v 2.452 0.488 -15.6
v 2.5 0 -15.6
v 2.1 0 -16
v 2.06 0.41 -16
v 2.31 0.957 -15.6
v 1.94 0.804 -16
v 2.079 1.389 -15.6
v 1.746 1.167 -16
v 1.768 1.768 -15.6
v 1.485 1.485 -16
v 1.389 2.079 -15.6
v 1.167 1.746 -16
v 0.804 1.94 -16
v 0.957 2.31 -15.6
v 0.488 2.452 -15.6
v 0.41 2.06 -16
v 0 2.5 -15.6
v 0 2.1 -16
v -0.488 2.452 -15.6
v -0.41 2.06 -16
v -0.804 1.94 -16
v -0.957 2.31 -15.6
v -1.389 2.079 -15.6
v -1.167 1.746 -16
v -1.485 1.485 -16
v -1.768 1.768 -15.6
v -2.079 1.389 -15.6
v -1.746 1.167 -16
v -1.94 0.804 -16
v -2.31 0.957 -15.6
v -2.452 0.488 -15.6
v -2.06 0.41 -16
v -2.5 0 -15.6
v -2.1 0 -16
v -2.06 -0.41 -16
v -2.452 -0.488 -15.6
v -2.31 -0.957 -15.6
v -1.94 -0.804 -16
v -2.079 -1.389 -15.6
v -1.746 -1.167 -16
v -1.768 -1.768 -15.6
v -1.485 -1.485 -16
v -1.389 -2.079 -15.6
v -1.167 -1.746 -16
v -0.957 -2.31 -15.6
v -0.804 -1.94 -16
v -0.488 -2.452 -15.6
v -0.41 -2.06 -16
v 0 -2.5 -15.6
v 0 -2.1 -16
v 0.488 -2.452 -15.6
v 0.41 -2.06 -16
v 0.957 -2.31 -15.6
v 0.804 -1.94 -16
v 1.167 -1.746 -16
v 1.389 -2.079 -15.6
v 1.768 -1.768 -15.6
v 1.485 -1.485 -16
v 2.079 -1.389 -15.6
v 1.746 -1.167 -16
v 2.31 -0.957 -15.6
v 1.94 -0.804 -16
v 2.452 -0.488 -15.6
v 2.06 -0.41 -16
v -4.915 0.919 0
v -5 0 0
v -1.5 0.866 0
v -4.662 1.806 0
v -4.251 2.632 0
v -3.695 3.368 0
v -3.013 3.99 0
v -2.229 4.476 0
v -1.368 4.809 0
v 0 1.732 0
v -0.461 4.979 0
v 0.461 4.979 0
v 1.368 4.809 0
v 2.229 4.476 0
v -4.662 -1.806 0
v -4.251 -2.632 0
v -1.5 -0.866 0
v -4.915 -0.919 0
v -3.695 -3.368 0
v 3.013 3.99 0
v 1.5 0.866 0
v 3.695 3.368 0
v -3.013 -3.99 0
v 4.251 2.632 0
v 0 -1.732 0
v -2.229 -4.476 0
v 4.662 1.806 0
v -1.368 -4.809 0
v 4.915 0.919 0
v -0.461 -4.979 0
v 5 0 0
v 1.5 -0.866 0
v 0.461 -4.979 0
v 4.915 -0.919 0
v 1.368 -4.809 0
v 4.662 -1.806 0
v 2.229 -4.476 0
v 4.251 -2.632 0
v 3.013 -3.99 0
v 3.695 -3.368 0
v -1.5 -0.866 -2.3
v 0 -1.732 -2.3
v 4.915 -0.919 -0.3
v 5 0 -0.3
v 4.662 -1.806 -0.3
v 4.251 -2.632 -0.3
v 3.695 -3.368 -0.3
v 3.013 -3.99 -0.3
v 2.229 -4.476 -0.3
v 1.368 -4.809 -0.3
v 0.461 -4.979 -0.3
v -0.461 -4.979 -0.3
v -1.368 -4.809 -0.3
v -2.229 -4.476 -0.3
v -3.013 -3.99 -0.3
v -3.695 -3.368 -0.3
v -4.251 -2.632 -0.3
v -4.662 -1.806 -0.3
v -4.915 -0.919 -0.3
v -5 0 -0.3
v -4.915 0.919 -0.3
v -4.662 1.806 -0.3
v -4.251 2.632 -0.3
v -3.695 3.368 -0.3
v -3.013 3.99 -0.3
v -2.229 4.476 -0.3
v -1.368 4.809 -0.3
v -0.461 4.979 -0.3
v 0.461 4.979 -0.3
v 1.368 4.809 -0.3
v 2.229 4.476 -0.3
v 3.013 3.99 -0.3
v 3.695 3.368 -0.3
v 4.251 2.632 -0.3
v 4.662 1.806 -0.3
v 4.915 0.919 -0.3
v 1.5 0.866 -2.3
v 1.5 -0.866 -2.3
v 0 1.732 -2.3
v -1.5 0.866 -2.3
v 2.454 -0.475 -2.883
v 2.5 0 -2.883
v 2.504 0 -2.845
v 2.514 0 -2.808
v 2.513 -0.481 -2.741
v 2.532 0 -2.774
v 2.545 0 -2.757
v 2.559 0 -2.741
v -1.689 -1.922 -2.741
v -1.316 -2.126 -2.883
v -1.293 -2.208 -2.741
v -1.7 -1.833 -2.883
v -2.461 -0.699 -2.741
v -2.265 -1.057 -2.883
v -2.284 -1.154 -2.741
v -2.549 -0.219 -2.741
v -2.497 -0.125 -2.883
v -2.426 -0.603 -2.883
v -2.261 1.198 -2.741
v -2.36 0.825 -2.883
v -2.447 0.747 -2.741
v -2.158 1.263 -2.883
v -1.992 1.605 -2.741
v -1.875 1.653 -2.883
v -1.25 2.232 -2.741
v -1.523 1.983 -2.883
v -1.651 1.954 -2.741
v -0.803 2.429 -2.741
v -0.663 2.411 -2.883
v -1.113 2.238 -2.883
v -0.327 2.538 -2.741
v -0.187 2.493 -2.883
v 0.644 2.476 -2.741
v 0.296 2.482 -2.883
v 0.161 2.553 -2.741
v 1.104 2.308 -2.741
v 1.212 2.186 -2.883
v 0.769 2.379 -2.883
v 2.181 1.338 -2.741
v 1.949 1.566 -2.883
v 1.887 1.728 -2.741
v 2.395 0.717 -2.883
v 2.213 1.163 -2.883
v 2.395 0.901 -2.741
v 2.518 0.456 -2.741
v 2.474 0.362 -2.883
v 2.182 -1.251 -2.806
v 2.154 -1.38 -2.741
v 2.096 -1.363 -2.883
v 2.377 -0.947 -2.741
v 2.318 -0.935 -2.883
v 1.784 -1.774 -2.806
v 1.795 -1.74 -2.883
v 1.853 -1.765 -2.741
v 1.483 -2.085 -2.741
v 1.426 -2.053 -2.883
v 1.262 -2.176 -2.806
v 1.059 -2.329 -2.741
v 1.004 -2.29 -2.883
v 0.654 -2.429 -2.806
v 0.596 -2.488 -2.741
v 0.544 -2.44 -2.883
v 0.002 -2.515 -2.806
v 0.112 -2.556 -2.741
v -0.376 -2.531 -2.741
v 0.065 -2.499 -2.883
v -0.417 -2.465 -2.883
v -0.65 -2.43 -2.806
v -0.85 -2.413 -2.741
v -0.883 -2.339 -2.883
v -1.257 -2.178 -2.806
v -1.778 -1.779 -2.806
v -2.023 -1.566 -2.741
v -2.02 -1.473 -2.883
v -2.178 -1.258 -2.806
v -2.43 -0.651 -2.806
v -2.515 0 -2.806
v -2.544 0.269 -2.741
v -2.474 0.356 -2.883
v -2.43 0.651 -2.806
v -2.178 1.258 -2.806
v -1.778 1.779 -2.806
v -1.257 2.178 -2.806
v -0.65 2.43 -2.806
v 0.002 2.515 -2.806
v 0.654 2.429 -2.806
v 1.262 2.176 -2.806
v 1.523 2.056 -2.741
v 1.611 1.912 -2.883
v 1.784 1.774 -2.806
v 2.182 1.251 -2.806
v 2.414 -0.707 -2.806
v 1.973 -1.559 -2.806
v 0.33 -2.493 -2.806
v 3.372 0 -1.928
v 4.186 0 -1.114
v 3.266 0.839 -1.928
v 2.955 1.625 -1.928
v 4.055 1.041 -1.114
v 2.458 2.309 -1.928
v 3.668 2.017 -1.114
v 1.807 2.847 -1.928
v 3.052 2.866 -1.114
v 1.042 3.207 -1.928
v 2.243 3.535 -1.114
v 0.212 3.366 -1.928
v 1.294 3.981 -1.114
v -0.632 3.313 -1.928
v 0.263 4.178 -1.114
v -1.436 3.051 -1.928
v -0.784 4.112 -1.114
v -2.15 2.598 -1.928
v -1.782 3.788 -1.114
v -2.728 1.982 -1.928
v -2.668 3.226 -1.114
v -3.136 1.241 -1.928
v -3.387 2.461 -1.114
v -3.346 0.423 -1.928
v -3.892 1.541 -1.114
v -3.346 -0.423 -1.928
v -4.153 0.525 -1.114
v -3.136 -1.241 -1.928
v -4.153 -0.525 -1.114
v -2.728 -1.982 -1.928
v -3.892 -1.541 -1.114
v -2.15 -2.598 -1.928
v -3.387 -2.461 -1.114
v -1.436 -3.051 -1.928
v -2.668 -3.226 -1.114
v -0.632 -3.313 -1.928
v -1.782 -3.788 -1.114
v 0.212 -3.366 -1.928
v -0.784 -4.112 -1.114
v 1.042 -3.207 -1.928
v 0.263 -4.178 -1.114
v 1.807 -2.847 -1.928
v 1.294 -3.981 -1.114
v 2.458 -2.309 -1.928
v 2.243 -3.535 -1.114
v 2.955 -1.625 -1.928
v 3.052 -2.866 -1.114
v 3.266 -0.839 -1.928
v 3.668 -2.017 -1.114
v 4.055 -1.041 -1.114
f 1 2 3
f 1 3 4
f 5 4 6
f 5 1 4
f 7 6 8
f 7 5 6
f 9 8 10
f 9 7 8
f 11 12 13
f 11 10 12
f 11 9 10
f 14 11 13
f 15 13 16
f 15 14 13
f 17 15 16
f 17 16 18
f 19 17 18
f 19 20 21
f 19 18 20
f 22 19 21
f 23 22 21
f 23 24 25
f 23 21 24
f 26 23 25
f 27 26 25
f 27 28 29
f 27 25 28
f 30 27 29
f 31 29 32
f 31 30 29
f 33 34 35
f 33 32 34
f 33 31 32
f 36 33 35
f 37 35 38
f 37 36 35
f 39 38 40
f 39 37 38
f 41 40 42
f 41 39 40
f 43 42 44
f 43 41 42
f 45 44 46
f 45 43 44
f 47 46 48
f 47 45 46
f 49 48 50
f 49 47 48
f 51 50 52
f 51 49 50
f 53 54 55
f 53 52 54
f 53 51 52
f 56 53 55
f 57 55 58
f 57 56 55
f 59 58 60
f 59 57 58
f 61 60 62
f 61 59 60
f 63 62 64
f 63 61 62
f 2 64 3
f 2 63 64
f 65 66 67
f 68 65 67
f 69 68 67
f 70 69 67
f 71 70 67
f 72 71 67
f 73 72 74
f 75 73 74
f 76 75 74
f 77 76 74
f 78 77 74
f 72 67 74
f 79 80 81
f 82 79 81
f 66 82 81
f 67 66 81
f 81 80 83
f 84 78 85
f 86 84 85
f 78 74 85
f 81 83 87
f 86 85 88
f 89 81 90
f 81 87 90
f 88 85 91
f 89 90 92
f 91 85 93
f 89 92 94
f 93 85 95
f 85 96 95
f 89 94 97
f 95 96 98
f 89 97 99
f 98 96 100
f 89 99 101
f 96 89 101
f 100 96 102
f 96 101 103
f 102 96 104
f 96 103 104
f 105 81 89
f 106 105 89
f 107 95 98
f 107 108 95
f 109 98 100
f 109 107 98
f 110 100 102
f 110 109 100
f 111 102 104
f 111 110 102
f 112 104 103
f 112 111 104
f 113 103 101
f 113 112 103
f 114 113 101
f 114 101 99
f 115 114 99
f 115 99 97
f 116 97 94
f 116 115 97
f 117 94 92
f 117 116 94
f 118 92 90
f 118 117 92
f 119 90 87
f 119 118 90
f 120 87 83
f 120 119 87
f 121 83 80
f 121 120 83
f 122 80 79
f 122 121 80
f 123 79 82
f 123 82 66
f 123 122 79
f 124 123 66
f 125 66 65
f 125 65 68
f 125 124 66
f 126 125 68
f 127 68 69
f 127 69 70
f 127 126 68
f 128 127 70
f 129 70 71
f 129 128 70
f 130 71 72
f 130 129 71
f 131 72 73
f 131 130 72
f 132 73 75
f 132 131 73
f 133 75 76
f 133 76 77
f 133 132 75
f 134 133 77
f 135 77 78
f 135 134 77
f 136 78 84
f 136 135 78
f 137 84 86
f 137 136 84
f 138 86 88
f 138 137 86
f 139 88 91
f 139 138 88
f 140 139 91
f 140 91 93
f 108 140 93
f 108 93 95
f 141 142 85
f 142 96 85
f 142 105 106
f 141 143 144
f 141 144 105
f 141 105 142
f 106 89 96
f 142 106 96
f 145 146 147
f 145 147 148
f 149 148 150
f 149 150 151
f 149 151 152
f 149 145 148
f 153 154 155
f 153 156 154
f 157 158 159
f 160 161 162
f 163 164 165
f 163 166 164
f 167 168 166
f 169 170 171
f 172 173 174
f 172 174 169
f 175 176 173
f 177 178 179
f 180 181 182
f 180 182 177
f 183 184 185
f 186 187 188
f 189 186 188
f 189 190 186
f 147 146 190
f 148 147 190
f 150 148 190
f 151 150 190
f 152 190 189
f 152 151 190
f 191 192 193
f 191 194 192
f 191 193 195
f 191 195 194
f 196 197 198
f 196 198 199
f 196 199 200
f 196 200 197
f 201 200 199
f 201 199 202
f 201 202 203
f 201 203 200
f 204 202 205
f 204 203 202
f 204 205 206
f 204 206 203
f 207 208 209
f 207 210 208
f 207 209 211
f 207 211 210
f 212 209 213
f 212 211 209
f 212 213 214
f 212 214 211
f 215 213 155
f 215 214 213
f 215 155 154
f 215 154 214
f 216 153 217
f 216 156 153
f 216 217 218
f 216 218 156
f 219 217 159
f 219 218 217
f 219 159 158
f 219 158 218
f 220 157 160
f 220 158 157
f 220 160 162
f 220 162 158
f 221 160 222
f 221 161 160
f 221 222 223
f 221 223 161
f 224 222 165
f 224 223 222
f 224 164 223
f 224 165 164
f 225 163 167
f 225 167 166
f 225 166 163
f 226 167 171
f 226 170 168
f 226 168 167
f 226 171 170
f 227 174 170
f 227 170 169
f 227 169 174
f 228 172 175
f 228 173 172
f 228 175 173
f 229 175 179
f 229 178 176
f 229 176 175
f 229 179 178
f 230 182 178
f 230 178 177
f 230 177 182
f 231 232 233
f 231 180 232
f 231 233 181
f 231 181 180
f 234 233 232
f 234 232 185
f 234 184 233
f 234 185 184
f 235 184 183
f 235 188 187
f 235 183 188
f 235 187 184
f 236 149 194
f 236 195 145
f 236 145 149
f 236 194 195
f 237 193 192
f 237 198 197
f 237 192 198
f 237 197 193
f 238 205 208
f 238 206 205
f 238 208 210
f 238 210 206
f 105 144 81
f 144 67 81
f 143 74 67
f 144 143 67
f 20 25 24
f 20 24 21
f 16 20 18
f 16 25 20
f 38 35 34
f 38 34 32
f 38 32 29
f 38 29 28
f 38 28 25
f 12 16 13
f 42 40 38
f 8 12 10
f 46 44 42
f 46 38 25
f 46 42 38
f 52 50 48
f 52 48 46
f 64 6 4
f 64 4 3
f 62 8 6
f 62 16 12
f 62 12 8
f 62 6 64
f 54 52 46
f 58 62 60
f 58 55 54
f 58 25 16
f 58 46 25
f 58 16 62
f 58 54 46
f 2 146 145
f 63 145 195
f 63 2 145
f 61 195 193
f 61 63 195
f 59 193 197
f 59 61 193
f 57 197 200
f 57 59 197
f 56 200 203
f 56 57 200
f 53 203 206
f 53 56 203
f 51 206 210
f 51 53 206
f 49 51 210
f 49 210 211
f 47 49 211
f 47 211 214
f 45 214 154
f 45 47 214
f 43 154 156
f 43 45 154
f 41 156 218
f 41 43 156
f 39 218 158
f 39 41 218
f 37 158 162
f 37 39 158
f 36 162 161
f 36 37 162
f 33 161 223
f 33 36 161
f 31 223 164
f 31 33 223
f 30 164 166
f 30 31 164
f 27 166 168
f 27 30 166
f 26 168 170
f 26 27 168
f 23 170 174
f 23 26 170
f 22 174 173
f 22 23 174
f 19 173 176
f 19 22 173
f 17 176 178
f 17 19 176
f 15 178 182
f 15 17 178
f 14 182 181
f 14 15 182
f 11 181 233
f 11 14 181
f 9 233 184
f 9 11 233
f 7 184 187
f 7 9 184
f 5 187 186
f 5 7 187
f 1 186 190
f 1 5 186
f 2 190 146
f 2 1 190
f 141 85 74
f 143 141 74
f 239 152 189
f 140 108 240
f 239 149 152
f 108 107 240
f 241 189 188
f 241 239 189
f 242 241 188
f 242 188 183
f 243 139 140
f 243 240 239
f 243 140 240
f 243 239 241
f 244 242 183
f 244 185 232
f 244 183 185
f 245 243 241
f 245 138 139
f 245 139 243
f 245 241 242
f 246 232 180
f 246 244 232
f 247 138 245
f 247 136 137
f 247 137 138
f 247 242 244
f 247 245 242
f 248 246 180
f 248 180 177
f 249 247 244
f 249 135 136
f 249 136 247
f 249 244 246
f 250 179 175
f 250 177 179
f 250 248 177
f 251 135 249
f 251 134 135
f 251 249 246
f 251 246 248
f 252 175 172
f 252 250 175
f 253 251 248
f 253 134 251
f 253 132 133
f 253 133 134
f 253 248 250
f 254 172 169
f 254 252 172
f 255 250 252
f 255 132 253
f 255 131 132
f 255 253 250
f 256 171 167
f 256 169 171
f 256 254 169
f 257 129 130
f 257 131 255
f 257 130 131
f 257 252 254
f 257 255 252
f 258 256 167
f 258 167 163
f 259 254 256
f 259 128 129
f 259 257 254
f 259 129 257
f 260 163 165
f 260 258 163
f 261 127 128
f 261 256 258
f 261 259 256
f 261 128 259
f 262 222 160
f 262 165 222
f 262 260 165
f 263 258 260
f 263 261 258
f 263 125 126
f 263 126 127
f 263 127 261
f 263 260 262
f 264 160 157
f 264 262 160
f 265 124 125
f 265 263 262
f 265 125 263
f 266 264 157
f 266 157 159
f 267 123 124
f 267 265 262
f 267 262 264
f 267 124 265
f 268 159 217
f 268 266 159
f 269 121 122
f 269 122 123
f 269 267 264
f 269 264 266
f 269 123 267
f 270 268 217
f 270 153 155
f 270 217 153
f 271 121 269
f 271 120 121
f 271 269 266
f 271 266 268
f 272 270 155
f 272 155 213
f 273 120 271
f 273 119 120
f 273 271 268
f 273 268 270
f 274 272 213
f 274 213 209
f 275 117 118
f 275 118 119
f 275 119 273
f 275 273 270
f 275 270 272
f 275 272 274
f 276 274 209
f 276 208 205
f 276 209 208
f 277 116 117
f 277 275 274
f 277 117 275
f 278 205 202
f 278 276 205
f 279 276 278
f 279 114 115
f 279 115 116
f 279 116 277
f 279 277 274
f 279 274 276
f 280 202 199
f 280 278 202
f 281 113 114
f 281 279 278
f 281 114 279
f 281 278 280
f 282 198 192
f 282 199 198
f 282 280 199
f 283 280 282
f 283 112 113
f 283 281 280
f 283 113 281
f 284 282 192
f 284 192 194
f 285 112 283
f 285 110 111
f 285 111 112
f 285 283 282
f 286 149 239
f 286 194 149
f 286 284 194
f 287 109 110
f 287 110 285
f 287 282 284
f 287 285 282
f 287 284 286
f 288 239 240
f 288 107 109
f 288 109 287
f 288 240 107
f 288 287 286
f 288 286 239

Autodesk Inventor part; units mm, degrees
ref_plane "YZ Plane" through (0, 0, 0) normal (1, 0, 0) x (0, 1, 0)
sketch "Szkic1" plane through (0, 0, 0) normal (0, 1, 0) x (-1, 0, 0)
  point P0 (0, 0)
sketch "Szkic2" plane through (0, 0, 0) normal (0, 1, 0) x (-1, 0, 0)
  line L0 (-2.5, -16) -> (0, -16)
  line L1 (-2.5, -2.8) -> (-2.5, -16)
  line L2 (-5, -0.3) -> (-2.5, -2.8)
  line L3 (-5, 0) -> (-5, -0.3)
  line L4 (0, 0) -> (-5, 0)
  line L5 (0, -16) -> (0, 0)
  line L6 (0, -16) -> (0, 0)
  line L7 (0, -19.2) -> (0, 3.2) projected
  line L8 (1, 0) -> (-6, 0) projected
  dimension "d3" = 5
  dimension "d5" = 2.5
  dimension "d7" = 16
  dimension "ParC" = 0.3
  dimension "d22" = 0
  dimension "d23" = 0
  dimension "d43" = 45
revolve "Obrót1" add sketch "Szkic2" angle 360 about axis through (0, 0, -16) along (0, 0, -1)
sketch "Szkic3" plane through (0, 0, 0) normal (0, 0, 1) x (1, 0, 0)
  line L0 (-1.5, 0.866) -> (-1.5, -0.866)
  line L1 (0, 1.7321) -> (-1.5, 0.866)
  line L2 (1.5, 0.866) -> (0, 1.7321)
  line L3 (1.5, -0.866) -> (1.5, 0.866)
  line L4 (0, -1.7321) -> (1.5, -0.866)
  line L5 (-1.5, -0.866) -> (0, -1.7321)
  circle A0 centre (0, 0) radius 1.5 construction
  circle A1 centre (0, 0) radius 2.5 construction
  dimension "d11" = 3
  dimension "d13" = 120
  dimension "d15" = 120
extrude "Wyciągnięcie proste1" cut sketch "Szkic3" against normal blind 2.3
fillet "Zaokrąglenie1" radius 0.2 1 edges at (-2.5, 0, -2.8)
chamfer "Faza1" distance 0.4 angle 45 1 edges at (-2.5, 0, -16) measured on face at (-0.599, -2.4272, -11.6276)
thread "Gwint1" size "M5x0.8" class "6g" standard "ISO Metric profile" length 11.6
ref_plane "MSC_PF1" through (0, 0, 0) normal (1, 0, 0) x (0, 1, 0)
ref_plane "MSC_PT1" through (0, 0, 0) normal (0, 0, -1) x (-1, 0, 0)
equation "\"d3\" = 0.5 * dk"
equation "\"d5\" = 0.5 * NND"
equation "\"d7\" = NLG"
equation "\"d43\" = 0.5 * ang"
equation "\"d11\" = ParS"
equation "\"d16\" = ParT"
equation "\"d18\" = r"
equation "\"d19\" = 0.5 * PTC"
equation "\"d39\" = 0.5 * PTC"
equation "\"NND\" = 5"
equation "\"PTC\" = 0.8"
equation "\"ParK\" = 2.8"
equation "\"ParS\" = 3"
equation "\"ParT\" = 2.3"
equation "\"r\" = 0.2"
equation "\"NLG\" = 16"
equation "\"ang\" = 90deg"
equation "\"THREADDIA\" = NND"
equation "\"dk\" = 10"
properties part number "DIN 7991 - M5x16" material "Stal, miękka"
